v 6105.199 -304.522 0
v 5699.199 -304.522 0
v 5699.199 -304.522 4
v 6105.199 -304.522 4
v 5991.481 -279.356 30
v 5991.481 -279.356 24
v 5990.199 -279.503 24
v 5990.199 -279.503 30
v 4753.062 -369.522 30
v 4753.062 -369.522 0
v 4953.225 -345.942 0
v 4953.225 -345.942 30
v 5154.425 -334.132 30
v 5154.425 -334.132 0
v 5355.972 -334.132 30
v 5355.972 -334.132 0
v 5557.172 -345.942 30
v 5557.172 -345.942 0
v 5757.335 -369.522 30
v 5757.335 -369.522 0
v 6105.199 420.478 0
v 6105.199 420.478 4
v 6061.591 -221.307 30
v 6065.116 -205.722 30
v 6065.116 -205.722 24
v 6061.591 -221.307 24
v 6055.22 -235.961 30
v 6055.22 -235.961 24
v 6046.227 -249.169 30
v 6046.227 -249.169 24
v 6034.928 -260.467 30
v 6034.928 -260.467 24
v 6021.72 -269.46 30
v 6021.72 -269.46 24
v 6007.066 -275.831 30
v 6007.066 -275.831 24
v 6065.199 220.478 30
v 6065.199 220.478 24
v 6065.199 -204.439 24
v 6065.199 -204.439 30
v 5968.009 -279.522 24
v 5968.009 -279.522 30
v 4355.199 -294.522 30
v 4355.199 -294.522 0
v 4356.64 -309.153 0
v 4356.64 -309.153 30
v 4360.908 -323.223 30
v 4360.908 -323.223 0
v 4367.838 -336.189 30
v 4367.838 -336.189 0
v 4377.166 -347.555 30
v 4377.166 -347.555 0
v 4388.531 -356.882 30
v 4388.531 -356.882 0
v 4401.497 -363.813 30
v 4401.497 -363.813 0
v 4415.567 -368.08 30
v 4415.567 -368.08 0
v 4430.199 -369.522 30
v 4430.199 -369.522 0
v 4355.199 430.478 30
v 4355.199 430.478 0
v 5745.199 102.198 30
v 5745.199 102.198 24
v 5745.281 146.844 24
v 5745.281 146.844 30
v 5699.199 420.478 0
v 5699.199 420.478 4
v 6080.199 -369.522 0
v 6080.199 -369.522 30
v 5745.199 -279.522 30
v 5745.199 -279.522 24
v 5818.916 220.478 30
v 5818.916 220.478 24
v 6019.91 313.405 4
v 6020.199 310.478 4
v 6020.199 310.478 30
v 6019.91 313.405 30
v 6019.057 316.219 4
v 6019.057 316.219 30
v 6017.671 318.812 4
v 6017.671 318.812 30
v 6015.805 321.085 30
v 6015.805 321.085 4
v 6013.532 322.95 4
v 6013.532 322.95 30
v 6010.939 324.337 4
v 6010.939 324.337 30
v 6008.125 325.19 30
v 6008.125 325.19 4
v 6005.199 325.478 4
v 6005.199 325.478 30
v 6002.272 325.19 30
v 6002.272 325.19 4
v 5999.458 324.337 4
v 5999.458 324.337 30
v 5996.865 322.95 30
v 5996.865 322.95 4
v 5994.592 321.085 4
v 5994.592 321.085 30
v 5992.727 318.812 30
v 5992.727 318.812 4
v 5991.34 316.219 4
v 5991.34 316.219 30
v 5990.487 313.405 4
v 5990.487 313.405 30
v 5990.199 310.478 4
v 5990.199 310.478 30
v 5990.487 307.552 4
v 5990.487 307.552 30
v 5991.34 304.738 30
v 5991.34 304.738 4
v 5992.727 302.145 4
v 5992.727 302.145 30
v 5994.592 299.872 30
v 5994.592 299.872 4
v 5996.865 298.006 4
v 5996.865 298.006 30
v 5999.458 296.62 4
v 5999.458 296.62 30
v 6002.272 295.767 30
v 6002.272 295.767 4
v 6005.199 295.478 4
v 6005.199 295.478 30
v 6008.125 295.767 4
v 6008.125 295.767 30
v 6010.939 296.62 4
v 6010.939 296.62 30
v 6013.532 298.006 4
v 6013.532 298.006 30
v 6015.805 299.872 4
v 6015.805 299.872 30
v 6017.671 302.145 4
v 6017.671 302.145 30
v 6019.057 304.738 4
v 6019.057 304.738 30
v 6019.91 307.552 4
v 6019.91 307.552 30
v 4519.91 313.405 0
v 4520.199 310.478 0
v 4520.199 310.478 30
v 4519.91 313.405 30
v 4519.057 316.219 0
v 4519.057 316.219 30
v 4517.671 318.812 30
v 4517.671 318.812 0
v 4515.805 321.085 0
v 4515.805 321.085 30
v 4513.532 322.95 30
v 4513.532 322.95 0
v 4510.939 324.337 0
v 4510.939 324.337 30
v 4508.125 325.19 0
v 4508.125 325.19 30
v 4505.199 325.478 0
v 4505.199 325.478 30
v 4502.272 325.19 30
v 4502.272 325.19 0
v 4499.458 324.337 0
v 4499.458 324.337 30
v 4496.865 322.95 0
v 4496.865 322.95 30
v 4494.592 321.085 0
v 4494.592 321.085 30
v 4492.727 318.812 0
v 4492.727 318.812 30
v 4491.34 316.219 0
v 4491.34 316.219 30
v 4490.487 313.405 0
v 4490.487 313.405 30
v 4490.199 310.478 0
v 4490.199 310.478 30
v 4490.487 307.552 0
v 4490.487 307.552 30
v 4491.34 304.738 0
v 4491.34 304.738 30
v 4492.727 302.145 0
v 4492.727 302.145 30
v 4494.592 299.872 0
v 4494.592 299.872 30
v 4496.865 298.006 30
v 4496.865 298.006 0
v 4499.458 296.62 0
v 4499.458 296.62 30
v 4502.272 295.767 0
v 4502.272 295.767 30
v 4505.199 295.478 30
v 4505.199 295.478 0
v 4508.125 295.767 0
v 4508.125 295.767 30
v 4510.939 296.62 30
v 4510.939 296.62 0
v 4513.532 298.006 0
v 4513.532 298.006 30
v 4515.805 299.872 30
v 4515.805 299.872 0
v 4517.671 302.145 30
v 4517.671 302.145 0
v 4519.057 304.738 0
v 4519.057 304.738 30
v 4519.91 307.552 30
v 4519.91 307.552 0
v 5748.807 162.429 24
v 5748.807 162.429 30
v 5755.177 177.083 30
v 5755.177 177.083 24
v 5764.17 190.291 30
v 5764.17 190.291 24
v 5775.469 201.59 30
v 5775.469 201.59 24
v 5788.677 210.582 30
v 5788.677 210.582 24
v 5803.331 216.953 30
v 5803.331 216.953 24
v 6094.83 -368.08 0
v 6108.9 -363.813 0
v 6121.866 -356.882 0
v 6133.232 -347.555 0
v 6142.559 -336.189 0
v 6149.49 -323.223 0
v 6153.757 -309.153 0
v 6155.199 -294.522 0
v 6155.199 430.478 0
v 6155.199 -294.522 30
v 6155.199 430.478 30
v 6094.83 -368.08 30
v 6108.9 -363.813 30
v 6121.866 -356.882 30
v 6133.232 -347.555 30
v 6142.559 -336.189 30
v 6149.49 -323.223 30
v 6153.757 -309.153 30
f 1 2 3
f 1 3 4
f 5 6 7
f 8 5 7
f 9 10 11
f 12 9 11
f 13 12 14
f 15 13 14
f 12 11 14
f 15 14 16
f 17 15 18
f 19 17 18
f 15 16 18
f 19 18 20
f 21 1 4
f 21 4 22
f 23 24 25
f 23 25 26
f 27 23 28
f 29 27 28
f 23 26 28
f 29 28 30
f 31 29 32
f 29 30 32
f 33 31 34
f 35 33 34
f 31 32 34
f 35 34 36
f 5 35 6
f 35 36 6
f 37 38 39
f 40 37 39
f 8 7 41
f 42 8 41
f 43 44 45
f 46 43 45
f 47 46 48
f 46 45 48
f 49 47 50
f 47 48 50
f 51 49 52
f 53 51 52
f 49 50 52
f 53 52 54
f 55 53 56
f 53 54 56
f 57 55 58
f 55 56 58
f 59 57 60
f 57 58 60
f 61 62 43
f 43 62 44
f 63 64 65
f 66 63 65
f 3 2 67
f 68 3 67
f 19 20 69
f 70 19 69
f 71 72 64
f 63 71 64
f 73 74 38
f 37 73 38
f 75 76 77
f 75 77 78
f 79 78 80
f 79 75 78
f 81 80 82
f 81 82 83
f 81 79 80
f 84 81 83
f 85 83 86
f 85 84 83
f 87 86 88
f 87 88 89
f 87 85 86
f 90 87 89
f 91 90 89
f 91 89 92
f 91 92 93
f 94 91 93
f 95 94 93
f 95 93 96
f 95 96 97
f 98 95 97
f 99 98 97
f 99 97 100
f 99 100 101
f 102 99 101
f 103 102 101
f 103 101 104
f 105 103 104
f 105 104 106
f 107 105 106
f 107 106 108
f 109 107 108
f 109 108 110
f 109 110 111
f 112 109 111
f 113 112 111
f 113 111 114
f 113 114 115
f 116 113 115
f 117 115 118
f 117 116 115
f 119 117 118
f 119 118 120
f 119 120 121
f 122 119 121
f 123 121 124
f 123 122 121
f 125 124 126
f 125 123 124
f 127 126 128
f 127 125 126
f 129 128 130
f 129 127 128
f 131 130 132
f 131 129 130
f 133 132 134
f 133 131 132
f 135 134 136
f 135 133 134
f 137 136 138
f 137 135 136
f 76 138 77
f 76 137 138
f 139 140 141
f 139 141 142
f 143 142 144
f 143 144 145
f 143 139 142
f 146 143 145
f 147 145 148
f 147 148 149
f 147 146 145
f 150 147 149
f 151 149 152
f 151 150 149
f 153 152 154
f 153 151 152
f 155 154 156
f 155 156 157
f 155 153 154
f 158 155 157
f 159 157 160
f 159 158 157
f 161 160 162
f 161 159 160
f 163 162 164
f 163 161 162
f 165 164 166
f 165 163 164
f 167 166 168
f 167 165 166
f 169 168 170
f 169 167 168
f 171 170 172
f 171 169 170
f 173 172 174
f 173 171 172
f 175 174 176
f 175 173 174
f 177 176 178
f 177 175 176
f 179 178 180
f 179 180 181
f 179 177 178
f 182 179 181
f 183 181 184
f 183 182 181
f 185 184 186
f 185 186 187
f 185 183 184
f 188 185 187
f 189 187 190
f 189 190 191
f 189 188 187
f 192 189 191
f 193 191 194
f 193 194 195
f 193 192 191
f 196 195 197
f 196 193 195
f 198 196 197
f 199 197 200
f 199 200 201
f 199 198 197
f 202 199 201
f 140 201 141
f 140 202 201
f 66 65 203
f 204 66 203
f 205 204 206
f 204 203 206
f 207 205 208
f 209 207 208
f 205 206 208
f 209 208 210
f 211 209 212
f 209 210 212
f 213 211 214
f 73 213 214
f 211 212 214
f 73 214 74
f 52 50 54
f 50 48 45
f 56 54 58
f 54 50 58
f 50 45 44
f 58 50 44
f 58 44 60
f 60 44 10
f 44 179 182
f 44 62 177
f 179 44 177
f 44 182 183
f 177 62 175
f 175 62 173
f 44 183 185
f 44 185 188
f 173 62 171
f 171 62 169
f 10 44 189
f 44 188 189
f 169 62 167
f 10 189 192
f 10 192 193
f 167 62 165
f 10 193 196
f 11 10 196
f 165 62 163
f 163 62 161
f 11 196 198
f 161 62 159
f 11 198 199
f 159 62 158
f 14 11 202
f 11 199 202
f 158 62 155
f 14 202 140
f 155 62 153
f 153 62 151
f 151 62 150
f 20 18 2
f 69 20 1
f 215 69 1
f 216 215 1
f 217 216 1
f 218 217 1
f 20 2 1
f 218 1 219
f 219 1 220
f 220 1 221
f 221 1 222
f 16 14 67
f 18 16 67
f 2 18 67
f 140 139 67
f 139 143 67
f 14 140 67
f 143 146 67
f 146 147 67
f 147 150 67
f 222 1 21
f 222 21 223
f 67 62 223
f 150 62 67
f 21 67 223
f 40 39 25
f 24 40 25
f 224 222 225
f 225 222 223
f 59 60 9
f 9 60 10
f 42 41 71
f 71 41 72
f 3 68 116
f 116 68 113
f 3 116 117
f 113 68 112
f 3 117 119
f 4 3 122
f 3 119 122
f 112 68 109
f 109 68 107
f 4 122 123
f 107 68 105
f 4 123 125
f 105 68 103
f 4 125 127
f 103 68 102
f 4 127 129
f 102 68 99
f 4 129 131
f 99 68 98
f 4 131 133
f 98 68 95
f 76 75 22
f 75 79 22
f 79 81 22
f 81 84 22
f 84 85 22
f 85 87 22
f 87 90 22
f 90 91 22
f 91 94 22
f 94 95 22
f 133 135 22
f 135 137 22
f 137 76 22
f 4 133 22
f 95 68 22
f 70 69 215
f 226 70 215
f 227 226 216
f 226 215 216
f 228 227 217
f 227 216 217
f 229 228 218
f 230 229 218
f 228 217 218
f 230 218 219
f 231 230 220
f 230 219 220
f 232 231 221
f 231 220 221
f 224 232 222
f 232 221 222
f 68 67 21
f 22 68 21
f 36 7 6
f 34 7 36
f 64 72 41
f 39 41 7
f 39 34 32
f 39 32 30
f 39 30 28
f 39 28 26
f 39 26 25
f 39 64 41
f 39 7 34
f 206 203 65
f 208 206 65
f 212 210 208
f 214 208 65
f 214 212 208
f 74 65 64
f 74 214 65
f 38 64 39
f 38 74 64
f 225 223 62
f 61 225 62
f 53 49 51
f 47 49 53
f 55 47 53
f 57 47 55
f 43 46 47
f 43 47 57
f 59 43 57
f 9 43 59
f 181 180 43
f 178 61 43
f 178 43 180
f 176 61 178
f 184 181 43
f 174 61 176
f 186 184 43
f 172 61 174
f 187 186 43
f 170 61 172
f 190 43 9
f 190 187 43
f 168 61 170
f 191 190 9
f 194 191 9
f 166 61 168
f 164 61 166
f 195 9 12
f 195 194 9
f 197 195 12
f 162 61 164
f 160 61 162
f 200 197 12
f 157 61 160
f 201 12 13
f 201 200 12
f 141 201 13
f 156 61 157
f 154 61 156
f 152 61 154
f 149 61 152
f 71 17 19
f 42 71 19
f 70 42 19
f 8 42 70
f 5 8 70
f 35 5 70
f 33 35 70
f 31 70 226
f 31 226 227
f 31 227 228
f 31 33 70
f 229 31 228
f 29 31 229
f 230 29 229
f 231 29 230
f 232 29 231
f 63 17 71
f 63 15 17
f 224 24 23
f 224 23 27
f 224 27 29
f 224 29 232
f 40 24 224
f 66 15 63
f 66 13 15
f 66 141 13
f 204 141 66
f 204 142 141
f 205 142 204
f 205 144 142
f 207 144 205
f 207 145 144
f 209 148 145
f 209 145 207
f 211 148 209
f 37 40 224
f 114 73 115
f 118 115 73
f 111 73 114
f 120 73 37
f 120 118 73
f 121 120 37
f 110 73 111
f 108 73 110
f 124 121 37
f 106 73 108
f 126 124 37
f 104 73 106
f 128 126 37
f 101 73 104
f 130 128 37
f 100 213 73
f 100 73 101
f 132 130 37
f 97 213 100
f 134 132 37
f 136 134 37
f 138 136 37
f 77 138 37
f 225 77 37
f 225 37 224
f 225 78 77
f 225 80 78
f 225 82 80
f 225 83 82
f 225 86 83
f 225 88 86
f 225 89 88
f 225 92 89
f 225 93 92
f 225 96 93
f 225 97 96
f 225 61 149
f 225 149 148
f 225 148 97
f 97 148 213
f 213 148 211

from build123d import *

# Parameters (mm, degrees)
F0_R     = 15
F1_DEPTH = 30
F2_DEPTH = 24
F3_W     = 406
F3_H     = 725
F3_R     = 15
F4_DEPTH = 4


# Not quite as in the source:
# - a feature names something its author has since deleted; it is built from what else it names


with BuildPart() as f1:
    # F0 (on Top) → F1 (new body)
    with BuildSketch(Plane.XY):
        with BuildLine():
            ThreePointArc((4355.1985619355, -294.5215593797), (4377.1655533465, -347.5545679687), (4430.1985619355, -369.5215593797))
            Line((4430.1985619355, -369.5215593797), (4753.0624461818, -369.5215593797))
            ThreePointArc((4753.0624461818, -369.5215593797), (5255.1985619355, -332.6549530029), (5757.3346776893, -369.5215593797))
            Line((5757.3346776893, -369.5215593797), (6080.1985619355, -369.5215593797))
            ThreePointArc((6080.1985619355, -369.5215593797), (6133.2315705245, -347.5545679687), (6155.1985619355, -294.5215593797))
            Line((6155.1985619355, -294.5215593797), (6155.1985619355, 430.4784406203))
            Line((6155.1985619355, 430.4784406203), (4355.1985619355, 430.4784406203))
            Line((4355.1985619355, 430.4784406203), (4355.1985619355, -294.5215593797))
        make_face()
        with BuildLine():
            Line((6065.1985619355, 163.3609871071), (6065.1985619355, -195.1546647585))
            Line((6065.1985619355, -195.1546647585), (6065.1985619355, -204.4389326959))
            Line((6065.1985619355, -204.4389326959), (6065.1159855294, -205.7217836249))
            ThreePointArc((6065.1159855294, -205.7217836249), (6040.8429178387, -255.0832383215), (5991.4814631421, -279.3563060122))
            Line((5991.4814631421, -279.3563060122), (5990.1985619355, -279.5026946765))
            Line((5990.1985619355, -279.5026946765), (5968.0089636665, -279.5215593797))
            Line((5968.0089636665, -279.5215593797), (5745.1985619355, -279.5215593797))
            Line((5745.1985619355, -279.5215593797), (5745.1985619355, 102.1975441552))
            Line((5745.1985619355, 102.1975441552), (5745.2811886192, 146.843918233))
            ThreePointArc((5745.2811886192, 146.843918233), (5769.55425631, 196.2053729296), (5818.9157110066, 220.4784406203))
            Line((5818.9157110066, 220.4784406203), (6065.1985619355, 220.4784406203))
            Line((6065.1985619355, 220.4784406203), (6065.1985619355, 163.3609871071))
        make_face(mode=Mode.SUBTRACT)
        with Locations((4505.1985619355, 310.4784406203)):
            Circle(F0_R, mode=Mode.SUBTRACT)
        with Locations((6005.1985619355, 310.4784406203)):
            Circle(F0_R, mode=Mode.SUBTRACT)
    extrude(amount=F1_DEPTH)

    # F0 (on Top) → F2 (join)
    with BuildSketch(Plane.XY):
        with BuildLine():
            Line((6065.1985619355, -204.4389326959), (6065.1985619355, -195.1546647585))
            Line((6065.1985619355, -195.1546647585), (6065.1985619355, 163.3609871071))
            Line((6065.1985619355, 163.3609871071), (6065.1985619355, 220.4784406203))
            Line((6065.1985619355, 220.4784406203), (5818.9157110066, 220.4784406203))
            ThreePointArc((5818.9157110066, 220.4784406203), (5769.55425631, 196.2053729296), (5745.2811886192, 146.843918233))
            Line((5745.2811886192, 146.843918233), (5745.1985619355, 102.1975441552))
            Line((5745.1985619355, 102.1975441552), (5745.1985619355, -279.5215593797))
            Line((5745.1985619355, -279.5215593797), (5968.0089636665, -279.5215593797))
            Line((5968.0089636665, -279.5215593797), (5990.1985619355, -279.5026946765))
            Line((5990.1985619355, -279.5026946765), (5991.4814631421, -279.3563060122))
            ThreePointArc((5991.4814631421, -279.3563060122), (6040.8429178387, -255.0832383215), (6065.1159855294, -205.7217836249))
            Line((6065.1159855294, -205.7217836249), (6065.1985619355, -204.4389326959))
        make_face()
    extrude(amount=F2_DEPTH)

    # F3 (on face) + F0 (on Top) → F4 (cut)
    with BuildSketch(Plane.XY):
        with Locations((5902.1985619355, 57.9784406203)):
            Rectangle(F3_W, F3_H)
        with BuildLine():
            Line((6065.1985619355, 220.4784406203), (6065.1985619355, 163.3609871071))
            Line((6065.1985619355, 163.3609871071), (6065.1985619355, -195.1546647585))
            Line((6065.1985619355, -195.1546647585), (6065.1985619355, -204.4389326959))
            Line((6065.1985619355, -204.4389326959), (6065.1159855294, -205.7217836249))
            ThreePointArc((6065.1159855294, -205.7217836249), (6040.8429178387, -255.0832383215), (5991.4814631421, -279.3563060122))
            Line((5991.4814631421, -279.3563060122), (5990.1985619355, -279.5026946765))
            Line((5990.1985619355, -279.5026946765), (5968.0089636665, -279.5215593797))
            Line((5968.0089636665, -279.5215593797), (5745.1985619355, -279.5215593797))
            Line((5745.1985619355, -279.5215593797), (5745.1985619355, 102.1975441552))
            Line((5745.1985619355, 102.1975441552), (5745.2811886192, 146.843918233))
            ThreePointArc((5745.2811886192, 146.843918233), (5769.55425631, 196.2053729296), (5818.9157110066, 220.4784406203))
            Line((5818.9157110066, 220.4784406203), (6065.1985619355, 220.4784406203))
        make_face(mode=Mode.SUBTRACT)
        with Locations((6005.1985619355, 310.4784406203)):
            Circle(F3_R, mode=Mode.SUBTRACT)
    with BuildSketch(Plane.XY):
        with BuildLine():
            Line((6065.1985619355, -204.4389326959), (6065.1985619355, -195.1546647585))
            Line((6065.1985619355, -195.1546647585), (6065.1985619355, 163.3609871071))
            Line((6065.1985619355, 163.3609871071), (6065.1985619355, 220.4784406203))
            Line((6065.1985619355, 220.4784406203), (5818.9157110066, 220.4784406203))
            ThreePointArc((5818.9157110066, 220.4784406203), (5769.55425631, 196.2053729296), (5745.2811886192, 146.843918233))
            Line((5745.2811886192, 146.843918233), (5745.1985619355, 102.1975441552))
            Line((5745.1985619355, 102.1975441552), (5745.1985619355, -279.5215593797))
            Line((5745.1985619355, -279.5215593797), (5968.0089636665, -279.5215593797))
            Line((5968.0089636665, -279.5215593797), (5990.1985619355, -279.5026946765))
            Line((5990.1985619355, -279.5026946765), (5991.4814631421, -279.3563060122))
            ThreePointArc((5991.4814631421, -279.3563060122), (6040.8429178387, -255.0832383215), (6065.1159855294, -205.7217836249))
            Line((6065.1159855294, -205.7217836249), (6065.1985619355, -204.4389326959))
        make_face()
    extrude(amount=F4_DEPTH, mode=Mode.SUBTRACT)


solid = f1.part
